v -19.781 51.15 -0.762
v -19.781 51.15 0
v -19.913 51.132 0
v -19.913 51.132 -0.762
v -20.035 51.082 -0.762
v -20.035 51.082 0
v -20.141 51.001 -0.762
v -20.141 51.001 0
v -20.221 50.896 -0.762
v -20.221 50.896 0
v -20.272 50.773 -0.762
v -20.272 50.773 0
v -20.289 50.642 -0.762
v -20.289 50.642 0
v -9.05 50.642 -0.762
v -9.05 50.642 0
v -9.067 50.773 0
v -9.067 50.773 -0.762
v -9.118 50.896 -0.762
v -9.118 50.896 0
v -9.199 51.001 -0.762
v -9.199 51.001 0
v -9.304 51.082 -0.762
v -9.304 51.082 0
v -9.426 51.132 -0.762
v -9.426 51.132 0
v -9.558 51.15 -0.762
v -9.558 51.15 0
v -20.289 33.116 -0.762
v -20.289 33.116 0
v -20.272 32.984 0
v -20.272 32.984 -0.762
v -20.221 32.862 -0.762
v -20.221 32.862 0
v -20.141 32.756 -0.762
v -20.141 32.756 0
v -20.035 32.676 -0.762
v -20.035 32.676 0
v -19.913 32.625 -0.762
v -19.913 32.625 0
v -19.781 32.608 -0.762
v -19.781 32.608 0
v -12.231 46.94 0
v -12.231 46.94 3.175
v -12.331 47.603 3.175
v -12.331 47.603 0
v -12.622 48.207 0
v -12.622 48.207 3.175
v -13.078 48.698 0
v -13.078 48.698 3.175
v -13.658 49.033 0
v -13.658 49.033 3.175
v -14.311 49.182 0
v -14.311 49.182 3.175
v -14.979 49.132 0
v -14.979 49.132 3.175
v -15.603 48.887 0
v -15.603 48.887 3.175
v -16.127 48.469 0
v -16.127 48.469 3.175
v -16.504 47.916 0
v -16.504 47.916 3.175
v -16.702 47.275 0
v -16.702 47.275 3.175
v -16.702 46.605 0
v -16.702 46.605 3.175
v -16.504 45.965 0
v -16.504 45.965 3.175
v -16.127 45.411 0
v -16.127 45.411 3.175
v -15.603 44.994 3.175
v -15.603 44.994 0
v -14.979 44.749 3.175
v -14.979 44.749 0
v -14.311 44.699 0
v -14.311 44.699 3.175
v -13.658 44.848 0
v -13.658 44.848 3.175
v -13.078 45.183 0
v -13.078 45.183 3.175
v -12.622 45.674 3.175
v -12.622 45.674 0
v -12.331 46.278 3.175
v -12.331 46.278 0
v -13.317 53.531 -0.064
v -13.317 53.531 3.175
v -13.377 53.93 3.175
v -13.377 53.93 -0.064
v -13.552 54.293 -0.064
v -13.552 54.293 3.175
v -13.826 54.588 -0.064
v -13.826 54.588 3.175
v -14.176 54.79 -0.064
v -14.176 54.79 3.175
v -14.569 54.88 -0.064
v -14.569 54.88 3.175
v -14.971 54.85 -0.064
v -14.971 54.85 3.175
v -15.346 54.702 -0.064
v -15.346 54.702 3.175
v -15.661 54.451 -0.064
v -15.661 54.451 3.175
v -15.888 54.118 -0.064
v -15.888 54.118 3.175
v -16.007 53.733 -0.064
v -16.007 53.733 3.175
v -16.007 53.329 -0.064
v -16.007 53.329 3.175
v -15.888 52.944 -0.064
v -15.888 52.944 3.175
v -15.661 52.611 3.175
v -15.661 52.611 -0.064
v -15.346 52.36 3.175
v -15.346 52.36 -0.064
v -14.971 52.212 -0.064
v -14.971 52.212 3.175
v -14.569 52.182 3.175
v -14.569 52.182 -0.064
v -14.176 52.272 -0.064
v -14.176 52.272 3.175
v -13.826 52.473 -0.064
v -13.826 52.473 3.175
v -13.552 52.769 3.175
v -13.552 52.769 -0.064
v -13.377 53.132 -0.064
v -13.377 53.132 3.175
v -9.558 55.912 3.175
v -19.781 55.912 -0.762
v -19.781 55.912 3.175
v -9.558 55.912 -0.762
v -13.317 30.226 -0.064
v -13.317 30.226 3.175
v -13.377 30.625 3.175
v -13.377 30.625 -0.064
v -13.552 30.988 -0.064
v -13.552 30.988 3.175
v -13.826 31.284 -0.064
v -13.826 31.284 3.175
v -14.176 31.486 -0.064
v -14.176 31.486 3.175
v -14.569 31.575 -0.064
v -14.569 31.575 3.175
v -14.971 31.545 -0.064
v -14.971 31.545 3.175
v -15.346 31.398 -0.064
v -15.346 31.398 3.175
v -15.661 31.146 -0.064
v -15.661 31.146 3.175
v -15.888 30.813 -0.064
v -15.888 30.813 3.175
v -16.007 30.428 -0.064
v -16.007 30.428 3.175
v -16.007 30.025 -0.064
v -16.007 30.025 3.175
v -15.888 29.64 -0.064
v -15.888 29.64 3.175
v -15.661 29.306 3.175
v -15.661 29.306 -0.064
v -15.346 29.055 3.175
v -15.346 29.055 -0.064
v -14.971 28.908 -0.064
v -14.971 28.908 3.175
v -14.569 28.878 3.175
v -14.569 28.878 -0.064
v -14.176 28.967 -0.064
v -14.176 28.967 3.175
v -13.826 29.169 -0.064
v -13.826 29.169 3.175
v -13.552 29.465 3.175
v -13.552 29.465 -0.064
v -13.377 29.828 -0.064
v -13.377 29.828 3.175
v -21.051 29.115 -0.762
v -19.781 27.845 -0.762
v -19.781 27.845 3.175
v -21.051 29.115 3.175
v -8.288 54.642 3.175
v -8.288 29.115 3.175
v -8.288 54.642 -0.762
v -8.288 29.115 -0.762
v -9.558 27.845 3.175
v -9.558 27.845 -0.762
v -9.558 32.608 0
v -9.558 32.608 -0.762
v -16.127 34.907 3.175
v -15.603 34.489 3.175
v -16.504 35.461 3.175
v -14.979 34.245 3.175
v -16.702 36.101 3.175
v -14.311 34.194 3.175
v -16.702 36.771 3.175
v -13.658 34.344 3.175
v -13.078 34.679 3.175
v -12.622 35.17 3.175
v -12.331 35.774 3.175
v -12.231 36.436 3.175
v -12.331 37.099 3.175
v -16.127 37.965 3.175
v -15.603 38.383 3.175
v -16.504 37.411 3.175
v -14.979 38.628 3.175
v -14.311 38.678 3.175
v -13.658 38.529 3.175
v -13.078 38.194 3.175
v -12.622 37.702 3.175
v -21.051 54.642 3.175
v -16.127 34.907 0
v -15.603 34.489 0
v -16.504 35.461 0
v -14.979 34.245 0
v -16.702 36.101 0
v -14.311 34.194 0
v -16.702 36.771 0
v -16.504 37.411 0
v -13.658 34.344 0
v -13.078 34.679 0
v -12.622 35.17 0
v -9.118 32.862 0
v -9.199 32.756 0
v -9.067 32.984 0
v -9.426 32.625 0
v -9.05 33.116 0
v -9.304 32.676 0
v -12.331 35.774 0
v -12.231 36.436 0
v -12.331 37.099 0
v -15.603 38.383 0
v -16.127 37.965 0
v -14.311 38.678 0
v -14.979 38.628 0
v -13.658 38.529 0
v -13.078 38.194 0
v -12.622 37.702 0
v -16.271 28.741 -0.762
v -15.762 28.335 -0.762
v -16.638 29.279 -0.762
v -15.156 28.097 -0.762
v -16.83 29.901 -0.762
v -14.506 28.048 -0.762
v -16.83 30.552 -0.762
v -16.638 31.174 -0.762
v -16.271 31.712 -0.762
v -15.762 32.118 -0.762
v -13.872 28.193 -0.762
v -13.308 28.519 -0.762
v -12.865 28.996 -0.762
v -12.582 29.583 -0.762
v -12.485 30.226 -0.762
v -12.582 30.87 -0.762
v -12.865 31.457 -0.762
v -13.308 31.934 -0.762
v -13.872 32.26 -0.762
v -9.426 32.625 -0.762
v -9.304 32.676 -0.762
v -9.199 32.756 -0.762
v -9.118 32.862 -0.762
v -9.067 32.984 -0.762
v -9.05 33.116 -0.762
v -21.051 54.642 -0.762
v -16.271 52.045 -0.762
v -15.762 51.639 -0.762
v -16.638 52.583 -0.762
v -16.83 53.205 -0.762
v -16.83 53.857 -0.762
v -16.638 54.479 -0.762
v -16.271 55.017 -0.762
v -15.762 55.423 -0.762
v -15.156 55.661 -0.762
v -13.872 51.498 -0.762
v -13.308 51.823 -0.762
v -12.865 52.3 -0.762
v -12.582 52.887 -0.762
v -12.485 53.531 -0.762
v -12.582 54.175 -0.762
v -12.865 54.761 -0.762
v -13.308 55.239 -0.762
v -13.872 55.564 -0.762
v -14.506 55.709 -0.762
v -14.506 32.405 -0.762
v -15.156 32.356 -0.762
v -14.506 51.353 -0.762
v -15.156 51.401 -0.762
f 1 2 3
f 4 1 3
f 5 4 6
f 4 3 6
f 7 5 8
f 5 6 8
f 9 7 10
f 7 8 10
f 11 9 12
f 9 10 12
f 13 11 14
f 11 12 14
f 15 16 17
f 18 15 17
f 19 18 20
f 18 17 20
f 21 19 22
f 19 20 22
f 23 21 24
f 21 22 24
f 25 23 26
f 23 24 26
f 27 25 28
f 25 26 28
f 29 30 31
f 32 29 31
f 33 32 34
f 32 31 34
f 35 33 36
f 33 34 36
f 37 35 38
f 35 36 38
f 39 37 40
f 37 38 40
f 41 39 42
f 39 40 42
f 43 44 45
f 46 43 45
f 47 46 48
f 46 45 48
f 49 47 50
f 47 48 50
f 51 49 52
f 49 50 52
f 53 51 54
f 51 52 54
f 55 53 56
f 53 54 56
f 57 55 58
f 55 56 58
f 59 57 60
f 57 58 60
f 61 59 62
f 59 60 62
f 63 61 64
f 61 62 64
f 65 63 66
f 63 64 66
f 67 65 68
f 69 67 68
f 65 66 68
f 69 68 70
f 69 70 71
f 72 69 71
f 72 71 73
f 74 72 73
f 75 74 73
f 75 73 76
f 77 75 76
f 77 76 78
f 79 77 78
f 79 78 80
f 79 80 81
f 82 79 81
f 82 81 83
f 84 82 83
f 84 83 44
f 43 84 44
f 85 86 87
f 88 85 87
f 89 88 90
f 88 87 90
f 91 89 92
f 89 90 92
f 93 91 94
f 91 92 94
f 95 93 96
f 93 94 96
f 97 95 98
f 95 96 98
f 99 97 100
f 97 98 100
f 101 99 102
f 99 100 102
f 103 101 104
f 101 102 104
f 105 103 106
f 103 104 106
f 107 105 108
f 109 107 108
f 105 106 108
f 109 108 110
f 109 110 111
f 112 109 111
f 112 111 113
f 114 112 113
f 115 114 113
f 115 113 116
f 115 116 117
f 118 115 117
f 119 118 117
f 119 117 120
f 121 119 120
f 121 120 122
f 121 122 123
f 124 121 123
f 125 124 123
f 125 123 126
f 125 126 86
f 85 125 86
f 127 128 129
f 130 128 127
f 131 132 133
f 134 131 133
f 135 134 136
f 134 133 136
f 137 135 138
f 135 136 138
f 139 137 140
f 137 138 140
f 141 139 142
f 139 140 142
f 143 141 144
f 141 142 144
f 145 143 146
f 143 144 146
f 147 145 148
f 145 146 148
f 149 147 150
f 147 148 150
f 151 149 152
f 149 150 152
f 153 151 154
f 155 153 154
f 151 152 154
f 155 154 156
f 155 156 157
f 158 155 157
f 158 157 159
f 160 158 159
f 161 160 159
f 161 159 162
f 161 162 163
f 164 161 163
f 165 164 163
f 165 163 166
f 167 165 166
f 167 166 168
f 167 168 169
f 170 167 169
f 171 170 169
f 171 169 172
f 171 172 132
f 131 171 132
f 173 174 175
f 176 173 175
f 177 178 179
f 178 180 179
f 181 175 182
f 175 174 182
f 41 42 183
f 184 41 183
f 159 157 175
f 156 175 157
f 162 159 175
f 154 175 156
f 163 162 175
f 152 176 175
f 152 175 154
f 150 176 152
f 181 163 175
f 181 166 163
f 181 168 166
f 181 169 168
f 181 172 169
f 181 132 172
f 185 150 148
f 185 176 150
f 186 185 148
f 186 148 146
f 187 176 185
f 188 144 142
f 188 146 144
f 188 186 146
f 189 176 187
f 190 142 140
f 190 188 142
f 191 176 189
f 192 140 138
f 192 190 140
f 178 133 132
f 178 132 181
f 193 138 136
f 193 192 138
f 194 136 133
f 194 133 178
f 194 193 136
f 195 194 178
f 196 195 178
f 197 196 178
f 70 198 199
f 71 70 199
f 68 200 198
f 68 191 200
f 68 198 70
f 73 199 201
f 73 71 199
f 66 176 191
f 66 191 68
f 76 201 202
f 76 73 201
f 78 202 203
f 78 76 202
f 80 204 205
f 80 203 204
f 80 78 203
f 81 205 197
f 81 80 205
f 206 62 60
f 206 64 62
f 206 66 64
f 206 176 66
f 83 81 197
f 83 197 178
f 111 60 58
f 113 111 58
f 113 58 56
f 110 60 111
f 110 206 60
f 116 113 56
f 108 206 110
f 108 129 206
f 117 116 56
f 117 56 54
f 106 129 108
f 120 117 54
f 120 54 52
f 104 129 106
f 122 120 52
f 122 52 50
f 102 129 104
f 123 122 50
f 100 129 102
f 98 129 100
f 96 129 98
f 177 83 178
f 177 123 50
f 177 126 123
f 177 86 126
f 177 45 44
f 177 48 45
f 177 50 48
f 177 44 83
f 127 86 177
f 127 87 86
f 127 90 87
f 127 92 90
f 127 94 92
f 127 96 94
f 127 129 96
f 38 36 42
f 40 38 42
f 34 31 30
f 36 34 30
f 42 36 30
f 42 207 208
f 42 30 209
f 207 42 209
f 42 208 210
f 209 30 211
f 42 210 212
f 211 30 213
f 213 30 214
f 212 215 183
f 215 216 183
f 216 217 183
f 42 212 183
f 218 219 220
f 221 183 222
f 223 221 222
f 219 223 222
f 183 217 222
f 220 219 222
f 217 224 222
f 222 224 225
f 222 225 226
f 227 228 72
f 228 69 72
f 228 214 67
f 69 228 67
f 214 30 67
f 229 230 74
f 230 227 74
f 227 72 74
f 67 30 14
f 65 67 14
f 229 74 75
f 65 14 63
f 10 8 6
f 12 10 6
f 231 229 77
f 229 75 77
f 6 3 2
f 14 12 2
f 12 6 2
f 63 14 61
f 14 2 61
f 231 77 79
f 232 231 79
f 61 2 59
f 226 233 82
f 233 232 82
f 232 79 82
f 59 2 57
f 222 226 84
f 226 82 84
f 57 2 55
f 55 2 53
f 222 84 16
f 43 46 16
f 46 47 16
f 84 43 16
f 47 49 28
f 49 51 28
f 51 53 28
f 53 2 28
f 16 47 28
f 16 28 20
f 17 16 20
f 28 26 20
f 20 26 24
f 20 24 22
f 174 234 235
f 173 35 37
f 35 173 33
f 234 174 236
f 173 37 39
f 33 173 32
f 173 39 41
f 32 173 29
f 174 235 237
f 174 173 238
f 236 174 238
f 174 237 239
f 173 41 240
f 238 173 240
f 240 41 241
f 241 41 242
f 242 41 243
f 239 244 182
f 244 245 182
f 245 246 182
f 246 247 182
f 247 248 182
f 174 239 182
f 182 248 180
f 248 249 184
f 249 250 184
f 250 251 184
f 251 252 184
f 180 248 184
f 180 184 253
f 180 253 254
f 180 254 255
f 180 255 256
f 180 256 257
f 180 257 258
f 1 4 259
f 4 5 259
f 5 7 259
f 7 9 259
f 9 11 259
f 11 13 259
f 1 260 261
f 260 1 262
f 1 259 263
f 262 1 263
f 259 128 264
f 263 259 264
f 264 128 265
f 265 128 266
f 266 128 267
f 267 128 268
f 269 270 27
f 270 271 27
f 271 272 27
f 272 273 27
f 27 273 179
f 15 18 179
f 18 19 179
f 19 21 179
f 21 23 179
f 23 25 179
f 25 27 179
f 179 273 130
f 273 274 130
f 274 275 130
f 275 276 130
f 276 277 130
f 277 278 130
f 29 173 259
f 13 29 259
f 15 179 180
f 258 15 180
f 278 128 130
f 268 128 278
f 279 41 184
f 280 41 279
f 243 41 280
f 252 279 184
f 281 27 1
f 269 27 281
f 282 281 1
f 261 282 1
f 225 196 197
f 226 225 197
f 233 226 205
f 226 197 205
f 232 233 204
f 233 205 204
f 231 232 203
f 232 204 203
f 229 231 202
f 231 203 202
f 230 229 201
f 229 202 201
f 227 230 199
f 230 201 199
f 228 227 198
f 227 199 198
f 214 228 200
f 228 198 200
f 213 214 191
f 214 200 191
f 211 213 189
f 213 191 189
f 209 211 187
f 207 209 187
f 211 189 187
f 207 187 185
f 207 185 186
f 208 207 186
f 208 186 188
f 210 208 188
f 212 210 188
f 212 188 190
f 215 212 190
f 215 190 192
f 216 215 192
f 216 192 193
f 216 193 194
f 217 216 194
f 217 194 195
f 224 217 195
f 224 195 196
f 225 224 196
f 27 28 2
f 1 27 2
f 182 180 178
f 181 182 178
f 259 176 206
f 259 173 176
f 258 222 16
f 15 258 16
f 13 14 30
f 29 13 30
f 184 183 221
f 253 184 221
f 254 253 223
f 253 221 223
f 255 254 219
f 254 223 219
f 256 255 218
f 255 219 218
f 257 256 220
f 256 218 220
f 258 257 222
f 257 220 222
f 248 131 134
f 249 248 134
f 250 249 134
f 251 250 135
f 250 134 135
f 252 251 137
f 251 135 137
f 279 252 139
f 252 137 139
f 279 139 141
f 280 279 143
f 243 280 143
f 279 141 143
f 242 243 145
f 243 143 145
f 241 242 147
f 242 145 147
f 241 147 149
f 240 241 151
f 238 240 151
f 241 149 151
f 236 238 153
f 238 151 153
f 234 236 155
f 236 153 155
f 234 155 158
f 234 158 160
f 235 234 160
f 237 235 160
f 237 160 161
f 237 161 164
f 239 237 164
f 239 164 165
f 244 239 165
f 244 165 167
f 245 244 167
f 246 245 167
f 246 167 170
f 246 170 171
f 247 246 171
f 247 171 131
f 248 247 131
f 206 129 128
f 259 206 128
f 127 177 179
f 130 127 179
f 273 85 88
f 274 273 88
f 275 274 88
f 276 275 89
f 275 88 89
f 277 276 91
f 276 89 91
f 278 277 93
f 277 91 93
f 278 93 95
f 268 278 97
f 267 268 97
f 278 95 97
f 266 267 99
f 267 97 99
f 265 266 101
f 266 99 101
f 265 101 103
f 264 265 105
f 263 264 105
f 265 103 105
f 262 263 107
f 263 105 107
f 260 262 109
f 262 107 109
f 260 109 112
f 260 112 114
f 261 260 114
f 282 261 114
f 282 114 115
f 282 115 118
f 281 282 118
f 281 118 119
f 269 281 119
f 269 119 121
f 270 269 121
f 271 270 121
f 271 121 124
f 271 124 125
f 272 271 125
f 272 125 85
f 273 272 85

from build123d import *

# Parameters (mm, degrees)
SKETCH1_W                                         = 12.7635
SKETCH1_H                                         = 28.067000578
BOSS_EXTRUDE1_DEPTH                               = 0.762
SKETCH3_W                                         = 12.7635
SKETCH3_H                                         = 28.067000578
BOSS_EXTRUDE2_DEPTH                               = 3.175
CSK_FOR_2_FLAT_HEAD_MACHINE_SCREW_100_D           = 2.7051
CSK_FOR_2_FLAT_HEAD_MACHINE_SCREW_100_DEPTH       = 3.937
CSK_FOR_2_FLAT_HEAD_MACHINE_SCREW_100_CSINK_D     = 4.3688
CSK_FOR_2_FLAT_HEAD_MACHINE_SCREW_100_CSINK_ANGLE = 100
F_16_0_177_DIAMETER_HOLE1_D                       = 4.4958
F_16_0_177_DIAMETER_HOLE1_DEPTH                   = 3.175
CHAMFER1_SIZE                                     = 1.27


with BuildPart() as part:
    # Sketch1 → Boss-Extrude1 (new body)
    with BuildSketch(Plane.XY):
        with Locations((-14.669644351, 41.878697202)):
            Rectangle(SKETCH1_W, SKETCH1_H)
        with BuildLine():
            Line((-9.049894351, 33.115696913), (-9.049894351, 50.641696913))
            ThreePointArc((-9.049894351, 50.641696913), (-9.198684106, 51.000907158), (-9.557894351, 51.149696913))
            Line((-9.557894351, 51.149696913), (-19.781394351, 51.149696913))
            ThreePointArc((-19.781394351, 51.149696913), (-20.140604596, 51.000907158), (-20.289394351, 50.641696913))
            Line((-20.289394351, 50.641696913), (-20.289394351, 33.115696913))
            ThreePointArc((-20.289394351, 33.115696913), (-20.140604596, 32.756486668), (-19.781394351, 32.607696913))
            Line((-19.781394351, 32.607696913), (-9.557894351, 32.607696913))
            ThreePointArc((-9.557894351, 32.607696913), (-9.198684106, 32.756486668), (-9.049894351, 33.115696913))
        make_face(mode=Mode.SUBTRACT)
    extrude(amount=-BOSS_EXTRUDE1_DEPTH)

    # Sketch3 → Boss-Extrude2 (add)
    with BuildSketch(Plane.XY):
        with Locations((-14.669644351, 41.878697202)):
            Rectangle(SKETCH3_W, SKETCH3_H)
    extrude(amount=BOSS_EXTRUDE2_DEPTH)

    # CSK for #2 Flat Head Machine Screw (100)1
    with Locations(Plane(origin=(0, 0, -0.762), x_dir=(-1, 0, 0), z_dir=(0, 0, -1))):
        with Locations((14.669644351, 53.530947491), (14.669644351, 30.226446913)):
            CounterSinkHole(CSK_FOR_2_FLAT_HEAD_MACHINE_SCREW_100_D / 2, CSK_FOR_2_FLAT_HEAD_MACHINE_SCREW_100_CSINK_D / 2, depth=CSK_FOR_2_FLAT_HEAD_MACHINE_SCREW_100_DEPTH, counter_sink_angle=CSK_FOR_2_FLAT_HEAD_MACHINE_SCREW_100_CSINK_ANGLE)

    # #16 (0.177) Diameter Hole1
    with Locations(Plane(origin=(0, 0, 0), x_dir=(-1, 0, 0), z_dir=(0, 0, -1))):
        with Locations((14.479144351, 36.436086129), (14.479144351, 46.940307697)):
            Hole(F_16_0_177_DIAMETER_HOLE1_D / 2, depth=F_16_0_177_DIAMETER_HOLE1_DEPTH)

    # Chamfer1
    chamfer1_edges = [part.edges().sort_by_distance(p)[0] for p in [
        (-8.287894351, 27.845196913, 1.2065),
        (-21.051394351, 27.845196913, 1.2065),
        (-21.051394351, 55.912197491, 1.2065),
        (-8.287894351, 55.912197491, 1.2065),
    ]]
    chamfer(chamfer1_edges, length=CHAMFER1_SIZE)


solid = part.part
